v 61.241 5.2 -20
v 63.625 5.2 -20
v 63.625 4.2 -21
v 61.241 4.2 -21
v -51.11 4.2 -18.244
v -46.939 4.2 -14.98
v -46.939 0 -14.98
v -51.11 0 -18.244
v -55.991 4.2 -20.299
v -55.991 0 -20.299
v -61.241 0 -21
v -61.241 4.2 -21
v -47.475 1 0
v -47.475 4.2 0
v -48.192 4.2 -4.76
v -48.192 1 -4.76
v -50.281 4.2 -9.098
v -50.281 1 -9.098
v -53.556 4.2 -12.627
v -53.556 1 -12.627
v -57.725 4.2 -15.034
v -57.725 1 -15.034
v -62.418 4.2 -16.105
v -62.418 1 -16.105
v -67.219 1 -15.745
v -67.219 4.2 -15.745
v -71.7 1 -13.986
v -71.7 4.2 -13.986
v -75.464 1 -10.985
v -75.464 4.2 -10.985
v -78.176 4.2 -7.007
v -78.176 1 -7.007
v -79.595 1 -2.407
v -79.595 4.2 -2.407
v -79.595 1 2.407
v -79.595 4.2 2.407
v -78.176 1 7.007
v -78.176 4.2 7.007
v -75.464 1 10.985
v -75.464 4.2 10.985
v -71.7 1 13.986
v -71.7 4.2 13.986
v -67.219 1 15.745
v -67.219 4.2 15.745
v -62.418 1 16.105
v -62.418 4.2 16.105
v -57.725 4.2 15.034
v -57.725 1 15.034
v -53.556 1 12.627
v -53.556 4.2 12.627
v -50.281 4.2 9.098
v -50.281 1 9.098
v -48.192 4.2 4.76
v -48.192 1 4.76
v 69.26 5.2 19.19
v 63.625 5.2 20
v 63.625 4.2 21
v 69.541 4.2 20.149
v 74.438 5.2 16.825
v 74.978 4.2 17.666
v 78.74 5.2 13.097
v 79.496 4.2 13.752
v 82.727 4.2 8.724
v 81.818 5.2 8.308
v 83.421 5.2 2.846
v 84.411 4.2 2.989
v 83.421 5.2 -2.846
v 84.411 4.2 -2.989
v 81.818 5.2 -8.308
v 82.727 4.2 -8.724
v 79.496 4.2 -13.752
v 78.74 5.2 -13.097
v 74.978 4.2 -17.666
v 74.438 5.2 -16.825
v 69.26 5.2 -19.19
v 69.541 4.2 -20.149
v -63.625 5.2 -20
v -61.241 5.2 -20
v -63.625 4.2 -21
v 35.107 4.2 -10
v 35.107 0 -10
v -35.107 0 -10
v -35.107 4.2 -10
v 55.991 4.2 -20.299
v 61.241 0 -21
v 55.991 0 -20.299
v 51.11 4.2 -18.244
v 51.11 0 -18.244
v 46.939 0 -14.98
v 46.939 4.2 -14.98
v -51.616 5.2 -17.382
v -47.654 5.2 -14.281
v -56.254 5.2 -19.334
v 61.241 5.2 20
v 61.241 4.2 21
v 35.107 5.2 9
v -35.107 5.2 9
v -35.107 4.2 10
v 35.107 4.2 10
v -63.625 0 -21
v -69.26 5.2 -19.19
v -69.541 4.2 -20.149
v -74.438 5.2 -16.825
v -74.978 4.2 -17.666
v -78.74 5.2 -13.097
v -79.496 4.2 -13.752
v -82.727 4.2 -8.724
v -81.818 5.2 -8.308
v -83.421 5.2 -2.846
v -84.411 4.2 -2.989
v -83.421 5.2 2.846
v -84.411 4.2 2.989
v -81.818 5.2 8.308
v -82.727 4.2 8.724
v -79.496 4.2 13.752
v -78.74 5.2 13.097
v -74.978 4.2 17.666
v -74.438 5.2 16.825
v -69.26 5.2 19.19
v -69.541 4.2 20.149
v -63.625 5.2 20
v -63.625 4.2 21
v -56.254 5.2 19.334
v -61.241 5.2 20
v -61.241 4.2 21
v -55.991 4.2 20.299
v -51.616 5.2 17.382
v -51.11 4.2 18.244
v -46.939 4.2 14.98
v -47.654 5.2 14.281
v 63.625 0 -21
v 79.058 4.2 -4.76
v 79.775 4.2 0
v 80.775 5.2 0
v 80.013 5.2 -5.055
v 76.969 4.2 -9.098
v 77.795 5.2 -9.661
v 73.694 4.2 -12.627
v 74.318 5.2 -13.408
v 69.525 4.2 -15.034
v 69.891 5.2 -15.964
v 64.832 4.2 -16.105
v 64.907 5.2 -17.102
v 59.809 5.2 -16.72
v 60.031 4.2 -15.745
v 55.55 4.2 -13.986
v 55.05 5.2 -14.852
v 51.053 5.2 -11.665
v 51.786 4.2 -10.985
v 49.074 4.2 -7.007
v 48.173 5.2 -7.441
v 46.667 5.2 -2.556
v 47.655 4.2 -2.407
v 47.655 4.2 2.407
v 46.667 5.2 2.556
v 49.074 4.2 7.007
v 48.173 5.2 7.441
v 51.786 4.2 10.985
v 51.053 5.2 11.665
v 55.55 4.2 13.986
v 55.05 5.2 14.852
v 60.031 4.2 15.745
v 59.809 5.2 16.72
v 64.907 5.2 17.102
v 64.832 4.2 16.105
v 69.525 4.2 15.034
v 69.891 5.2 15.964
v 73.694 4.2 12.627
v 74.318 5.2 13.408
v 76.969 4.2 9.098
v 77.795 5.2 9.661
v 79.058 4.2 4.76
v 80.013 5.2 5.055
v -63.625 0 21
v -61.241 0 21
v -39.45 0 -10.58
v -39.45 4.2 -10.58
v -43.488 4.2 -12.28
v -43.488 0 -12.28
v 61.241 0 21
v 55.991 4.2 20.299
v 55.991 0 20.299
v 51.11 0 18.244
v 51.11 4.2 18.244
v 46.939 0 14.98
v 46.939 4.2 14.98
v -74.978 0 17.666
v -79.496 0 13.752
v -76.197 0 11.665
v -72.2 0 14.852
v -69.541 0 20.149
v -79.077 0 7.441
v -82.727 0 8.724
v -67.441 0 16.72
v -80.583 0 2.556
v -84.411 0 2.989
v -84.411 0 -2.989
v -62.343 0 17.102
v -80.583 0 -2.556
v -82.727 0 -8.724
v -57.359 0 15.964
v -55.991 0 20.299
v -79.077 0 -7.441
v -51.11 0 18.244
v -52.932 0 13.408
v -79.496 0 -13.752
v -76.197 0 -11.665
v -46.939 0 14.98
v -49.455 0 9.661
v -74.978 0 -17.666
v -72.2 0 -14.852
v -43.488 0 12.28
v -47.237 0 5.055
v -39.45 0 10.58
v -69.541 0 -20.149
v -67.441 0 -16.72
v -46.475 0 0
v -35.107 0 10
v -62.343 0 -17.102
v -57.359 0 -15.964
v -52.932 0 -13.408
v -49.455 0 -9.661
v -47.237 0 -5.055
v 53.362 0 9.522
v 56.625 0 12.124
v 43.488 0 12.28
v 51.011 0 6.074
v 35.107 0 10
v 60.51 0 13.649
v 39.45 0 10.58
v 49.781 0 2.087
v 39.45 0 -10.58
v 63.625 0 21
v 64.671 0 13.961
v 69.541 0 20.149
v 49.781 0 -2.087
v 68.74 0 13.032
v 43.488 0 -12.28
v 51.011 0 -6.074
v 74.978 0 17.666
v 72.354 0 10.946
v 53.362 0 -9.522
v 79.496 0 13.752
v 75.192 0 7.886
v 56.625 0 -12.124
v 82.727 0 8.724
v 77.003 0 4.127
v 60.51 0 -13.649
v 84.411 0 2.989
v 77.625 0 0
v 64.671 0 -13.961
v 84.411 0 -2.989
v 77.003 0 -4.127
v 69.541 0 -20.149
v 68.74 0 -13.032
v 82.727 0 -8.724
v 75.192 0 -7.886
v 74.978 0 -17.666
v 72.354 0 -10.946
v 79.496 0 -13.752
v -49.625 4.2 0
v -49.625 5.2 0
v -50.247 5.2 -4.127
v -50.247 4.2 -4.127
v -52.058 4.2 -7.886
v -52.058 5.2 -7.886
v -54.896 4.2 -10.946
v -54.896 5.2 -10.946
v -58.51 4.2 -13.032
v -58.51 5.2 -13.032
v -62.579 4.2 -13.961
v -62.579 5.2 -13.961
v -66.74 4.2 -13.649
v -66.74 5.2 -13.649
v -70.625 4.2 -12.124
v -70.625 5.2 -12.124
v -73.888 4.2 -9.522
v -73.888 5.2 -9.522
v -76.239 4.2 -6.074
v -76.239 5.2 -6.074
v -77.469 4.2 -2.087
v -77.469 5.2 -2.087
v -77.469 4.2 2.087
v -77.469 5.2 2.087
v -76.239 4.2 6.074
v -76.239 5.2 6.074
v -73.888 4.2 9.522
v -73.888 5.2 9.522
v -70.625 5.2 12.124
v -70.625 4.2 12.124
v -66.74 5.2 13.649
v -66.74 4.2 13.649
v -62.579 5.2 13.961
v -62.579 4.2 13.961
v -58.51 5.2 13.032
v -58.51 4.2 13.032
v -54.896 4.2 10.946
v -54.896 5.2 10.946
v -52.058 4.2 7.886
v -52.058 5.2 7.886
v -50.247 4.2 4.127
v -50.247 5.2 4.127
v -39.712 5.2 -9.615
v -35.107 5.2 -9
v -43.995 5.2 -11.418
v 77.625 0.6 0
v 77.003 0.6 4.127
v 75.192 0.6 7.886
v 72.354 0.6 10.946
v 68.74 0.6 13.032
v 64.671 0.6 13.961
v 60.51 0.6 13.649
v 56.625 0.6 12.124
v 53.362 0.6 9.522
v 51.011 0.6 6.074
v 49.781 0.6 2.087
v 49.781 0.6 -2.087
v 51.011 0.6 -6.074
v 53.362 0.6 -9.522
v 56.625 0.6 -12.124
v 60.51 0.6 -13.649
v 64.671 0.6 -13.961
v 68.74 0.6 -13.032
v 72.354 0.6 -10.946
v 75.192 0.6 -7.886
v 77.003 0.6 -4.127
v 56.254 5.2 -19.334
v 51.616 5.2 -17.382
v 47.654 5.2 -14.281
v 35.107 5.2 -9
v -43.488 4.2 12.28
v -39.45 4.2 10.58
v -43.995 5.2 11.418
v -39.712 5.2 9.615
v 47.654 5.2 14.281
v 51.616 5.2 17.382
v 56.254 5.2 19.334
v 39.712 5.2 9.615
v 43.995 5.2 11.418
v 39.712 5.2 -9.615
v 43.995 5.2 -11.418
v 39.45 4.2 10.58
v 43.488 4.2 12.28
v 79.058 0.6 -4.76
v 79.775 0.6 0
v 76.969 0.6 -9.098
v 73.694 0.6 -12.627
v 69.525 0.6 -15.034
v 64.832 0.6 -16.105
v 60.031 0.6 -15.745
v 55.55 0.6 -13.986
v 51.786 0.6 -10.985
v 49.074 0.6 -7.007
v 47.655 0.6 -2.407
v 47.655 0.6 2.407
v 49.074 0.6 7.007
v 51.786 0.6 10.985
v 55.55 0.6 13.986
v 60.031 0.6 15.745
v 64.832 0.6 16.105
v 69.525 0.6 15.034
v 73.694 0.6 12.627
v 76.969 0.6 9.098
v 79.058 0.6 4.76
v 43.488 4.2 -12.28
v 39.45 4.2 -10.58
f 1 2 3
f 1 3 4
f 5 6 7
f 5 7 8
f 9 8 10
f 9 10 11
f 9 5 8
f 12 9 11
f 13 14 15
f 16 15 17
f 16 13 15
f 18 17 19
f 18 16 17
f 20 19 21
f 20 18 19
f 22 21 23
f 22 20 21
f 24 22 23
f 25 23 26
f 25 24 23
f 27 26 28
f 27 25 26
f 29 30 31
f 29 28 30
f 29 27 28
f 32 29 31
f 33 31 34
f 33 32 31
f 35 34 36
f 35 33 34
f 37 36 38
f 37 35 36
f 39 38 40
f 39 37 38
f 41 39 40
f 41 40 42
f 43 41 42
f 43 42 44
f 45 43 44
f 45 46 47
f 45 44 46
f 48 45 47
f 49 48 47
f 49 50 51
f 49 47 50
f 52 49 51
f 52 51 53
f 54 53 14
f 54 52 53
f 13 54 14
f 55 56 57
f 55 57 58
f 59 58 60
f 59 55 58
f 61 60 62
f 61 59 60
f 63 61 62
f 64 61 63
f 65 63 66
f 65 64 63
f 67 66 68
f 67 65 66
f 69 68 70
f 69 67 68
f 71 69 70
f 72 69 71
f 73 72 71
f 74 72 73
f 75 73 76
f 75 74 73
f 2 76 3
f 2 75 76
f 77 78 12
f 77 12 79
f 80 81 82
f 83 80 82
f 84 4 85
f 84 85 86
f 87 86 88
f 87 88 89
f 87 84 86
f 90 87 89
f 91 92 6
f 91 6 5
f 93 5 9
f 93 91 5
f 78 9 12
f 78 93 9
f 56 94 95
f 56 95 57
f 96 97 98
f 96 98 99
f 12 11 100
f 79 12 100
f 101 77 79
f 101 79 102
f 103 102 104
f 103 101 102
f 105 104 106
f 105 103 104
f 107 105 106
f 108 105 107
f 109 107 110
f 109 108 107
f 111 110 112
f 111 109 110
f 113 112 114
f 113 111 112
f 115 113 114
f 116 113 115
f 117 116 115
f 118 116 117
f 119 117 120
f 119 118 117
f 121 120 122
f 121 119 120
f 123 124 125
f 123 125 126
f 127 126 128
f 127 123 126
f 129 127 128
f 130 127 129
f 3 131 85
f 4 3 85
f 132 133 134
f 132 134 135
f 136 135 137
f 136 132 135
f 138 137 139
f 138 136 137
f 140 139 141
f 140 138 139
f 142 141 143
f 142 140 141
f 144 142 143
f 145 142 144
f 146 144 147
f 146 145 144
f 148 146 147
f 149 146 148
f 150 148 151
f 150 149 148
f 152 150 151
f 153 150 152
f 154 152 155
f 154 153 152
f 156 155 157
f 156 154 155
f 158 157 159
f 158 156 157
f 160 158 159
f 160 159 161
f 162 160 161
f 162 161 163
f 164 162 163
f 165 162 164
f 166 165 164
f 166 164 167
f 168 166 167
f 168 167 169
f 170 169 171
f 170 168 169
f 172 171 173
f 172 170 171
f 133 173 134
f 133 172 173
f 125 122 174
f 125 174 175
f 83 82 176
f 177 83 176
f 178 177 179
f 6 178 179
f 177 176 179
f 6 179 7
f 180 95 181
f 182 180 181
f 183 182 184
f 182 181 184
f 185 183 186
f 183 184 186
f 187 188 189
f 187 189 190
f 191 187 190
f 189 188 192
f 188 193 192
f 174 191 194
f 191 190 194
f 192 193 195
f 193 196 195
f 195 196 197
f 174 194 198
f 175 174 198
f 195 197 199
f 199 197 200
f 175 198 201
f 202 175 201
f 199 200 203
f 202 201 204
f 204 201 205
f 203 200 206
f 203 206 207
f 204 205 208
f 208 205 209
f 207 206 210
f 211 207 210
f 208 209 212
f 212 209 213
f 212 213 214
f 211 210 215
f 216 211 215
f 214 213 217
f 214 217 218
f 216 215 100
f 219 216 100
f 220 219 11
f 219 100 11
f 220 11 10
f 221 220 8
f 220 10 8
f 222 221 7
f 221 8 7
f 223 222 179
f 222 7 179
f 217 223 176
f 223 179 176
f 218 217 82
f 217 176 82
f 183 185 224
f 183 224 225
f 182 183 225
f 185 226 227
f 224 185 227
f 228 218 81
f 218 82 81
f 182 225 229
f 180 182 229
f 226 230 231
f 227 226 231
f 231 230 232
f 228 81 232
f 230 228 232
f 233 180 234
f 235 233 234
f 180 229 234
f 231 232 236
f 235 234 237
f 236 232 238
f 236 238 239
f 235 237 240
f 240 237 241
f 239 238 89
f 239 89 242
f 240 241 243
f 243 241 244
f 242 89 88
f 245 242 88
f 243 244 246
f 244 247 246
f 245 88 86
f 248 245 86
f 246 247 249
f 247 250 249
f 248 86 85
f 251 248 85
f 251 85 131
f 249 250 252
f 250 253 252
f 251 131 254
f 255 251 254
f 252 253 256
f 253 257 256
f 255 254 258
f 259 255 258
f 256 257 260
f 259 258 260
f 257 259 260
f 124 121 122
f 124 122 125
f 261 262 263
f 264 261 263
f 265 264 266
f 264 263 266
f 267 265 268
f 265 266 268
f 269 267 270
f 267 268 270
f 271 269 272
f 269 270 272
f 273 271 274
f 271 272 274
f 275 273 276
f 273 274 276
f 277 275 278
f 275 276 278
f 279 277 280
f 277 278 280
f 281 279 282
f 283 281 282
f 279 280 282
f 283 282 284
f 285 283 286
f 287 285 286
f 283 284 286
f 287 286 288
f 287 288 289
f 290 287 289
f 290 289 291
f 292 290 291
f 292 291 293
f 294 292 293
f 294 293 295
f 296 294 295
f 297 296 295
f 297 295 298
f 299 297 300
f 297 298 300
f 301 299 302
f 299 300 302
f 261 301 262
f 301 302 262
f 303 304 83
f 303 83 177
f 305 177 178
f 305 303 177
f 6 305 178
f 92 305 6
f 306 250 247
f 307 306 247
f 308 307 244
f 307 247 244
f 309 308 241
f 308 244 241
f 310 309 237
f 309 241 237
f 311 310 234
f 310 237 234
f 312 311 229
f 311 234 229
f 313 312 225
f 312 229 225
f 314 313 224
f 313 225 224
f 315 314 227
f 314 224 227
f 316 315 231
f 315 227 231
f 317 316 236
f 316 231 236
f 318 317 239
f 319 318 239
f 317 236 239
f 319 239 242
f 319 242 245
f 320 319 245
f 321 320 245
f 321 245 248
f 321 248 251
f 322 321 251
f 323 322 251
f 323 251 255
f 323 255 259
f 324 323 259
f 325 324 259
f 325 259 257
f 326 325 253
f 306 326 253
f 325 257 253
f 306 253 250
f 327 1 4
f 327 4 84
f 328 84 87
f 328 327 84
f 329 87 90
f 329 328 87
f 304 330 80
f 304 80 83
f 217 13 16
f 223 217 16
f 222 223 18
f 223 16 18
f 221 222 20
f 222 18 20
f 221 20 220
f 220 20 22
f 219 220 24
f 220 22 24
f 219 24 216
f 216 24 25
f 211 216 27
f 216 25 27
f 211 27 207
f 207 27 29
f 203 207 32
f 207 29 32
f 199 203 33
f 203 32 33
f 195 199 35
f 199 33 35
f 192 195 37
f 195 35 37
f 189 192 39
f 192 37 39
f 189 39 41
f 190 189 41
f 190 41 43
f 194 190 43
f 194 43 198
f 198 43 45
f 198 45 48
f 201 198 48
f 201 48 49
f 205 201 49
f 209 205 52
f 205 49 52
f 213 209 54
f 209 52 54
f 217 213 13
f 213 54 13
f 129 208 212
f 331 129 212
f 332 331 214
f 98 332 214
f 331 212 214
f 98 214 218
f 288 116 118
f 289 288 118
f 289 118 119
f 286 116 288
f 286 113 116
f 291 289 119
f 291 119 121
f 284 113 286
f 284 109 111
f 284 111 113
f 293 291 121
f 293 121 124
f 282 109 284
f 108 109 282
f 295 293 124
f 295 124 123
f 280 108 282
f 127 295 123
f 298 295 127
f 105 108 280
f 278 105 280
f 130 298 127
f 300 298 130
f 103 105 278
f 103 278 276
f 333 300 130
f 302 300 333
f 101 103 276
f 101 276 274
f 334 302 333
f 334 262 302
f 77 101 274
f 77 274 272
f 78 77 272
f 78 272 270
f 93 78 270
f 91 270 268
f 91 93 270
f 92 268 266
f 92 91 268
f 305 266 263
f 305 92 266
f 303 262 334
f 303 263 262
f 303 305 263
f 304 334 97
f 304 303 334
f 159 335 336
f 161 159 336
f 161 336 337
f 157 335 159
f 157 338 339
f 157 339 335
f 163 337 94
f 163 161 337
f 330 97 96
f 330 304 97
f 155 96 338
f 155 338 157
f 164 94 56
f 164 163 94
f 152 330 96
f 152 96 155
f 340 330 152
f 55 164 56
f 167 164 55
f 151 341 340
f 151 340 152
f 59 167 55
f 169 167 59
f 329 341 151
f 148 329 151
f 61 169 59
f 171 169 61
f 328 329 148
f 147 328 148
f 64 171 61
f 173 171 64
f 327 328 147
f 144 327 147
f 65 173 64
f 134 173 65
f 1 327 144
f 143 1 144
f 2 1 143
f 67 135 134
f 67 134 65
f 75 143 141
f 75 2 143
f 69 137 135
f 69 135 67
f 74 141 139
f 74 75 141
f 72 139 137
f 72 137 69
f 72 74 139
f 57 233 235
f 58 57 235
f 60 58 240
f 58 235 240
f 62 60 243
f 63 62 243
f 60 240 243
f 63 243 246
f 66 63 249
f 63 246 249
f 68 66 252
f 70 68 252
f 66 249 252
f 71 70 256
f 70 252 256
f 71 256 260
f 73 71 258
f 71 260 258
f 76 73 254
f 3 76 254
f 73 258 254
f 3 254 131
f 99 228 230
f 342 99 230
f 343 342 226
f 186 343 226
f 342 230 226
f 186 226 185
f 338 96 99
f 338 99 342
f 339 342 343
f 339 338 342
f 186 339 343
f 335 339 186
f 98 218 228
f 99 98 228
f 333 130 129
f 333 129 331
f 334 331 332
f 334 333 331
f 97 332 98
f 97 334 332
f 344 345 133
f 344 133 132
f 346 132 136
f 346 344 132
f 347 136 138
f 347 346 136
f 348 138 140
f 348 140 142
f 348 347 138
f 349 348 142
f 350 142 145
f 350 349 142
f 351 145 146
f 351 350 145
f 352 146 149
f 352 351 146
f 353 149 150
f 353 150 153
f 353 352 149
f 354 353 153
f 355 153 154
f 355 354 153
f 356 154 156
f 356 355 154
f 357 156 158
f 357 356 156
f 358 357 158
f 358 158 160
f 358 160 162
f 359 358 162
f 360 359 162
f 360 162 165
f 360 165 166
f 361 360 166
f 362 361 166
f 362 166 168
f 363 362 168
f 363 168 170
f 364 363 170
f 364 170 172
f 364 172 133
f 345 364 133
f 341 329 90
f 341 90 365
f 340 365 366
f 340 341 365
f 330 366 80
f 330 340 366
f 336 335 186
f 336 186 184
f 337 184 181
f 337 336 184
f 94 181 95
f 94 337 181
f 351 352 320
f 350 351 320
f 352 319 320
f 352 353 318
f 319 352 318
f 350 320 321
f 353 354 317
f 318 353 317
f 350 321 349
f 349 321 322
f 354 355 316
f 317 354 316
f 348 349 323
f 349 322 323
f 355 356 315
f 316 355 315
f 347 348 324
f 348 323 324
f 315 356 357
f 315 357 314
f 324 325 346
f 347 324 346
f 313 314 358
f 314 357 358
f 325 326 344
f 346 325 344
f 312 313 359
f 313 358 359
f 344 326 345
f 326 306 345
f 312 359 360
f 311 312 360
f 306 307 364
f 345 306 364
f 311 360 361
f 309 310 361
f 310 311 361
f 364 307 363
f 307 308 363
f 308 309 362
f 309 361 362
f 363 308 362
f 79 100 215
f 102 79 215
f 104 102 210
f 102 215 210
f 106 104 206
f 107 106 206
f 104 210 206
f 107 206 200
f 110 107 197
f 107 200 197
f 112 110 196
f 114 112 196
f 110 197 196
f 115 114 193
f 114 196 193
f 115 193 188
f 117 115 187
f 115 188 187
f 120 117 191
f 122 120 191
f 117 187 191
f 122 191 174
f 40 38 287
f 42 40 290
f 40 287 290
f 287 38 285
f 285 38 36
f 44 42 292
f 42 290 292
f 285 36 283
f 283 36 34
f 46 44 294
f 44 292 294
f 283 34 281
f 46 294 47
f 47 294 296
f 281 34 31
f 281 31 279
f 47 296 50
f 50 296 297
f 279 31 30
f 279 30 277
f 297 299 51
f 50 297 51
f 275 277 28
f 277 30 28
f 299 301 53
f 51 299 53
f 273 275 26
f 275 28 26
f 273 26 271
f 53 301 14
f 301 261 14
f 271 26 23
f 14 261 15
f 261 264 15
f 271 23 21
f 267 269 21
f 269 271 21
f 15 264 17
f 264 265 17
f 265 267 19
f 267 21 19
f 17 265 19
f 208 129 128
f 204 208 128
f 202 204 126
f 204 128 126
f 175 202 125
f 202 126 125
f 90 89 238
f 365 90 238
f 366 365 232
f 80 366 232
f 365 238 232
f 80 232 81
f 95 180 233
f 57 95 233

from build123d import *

# Parameters (mm, degrees)
SKETCH1_R           = 16.15
BOSS_EXTRUDE1_DEPTH = 5.2
FILLET1_R           = 20
CHAMFER1_SIZE       = 1
SKETCH2_R           = 19.025242353
SKETCH2_R_2         = 14
BOSS_EXTRUDE2_DEPTH = 0.6
SKETCH4_R           = 18.71529055
SKETCH4_R_2         = 14
BOSS_EXTRUDE3_DEPTH = 1
CHAMFER2_SIZE       = 1


with BuildPart() as part:
    # Sketch1 → Boss-Extrude1 (new body)
    with BuildSketch(Plane(origin=(0, 0, 0), x_dir=(1, 0, 0), z_dir=(0, 1, 0))):
        with BuildLine():
            Line((50.6952797, -21), (63.625, -21))
            ThreePointArc((63.625, -21), (84.625, 0), (63.625, 21))
            Line((63.625, 21), (50.6952797, 21))
            ThreePointArc((50.6952797, 21), (44.646090821, 13.026866227), (35.106613419, 10))
            Line((35.106613419, 10), (-35.106613419, 10))
            ThreePointArc((-35.106613419, 10), (-44.646090821, 13.026866227), (-50.6952797, 21))
            Line((-50.6952797, 21), (-63.625, 21))
            ThreePointArc((-63.625, 21), (-84.625, 0), (-63.625, -21))
            Line((-63.625, -21), (-50.6952797, -21))
            ThreePointArc((-50.6952797, -21), (-44.646090821, -13.026866227), (-35.106613419, -10))
            Line((-35.106613419, -10), (35.106613419, -10))
            ThreePointArc((35.106613419, -10), (44.646090821, -13.026866227), (50.6952797, -21))
        make_face()
        with Locations((-63.625, 0)):
            Circle(SKETCH1_R, mode=Mode.SUBTRACT)
        with Locations((63.625, 0)):
            Circle(SKETCH1_R, mode=Mode.SUBTRACT)
    extrude(amount=BOSS_EXTRUDE1_DEPTH)

    # Fillet1
    fillet1_edges = [part.edges().sort_by_distance(p)[0] for p in [
        (-50.6952797, 2.6, 21),
        (-50.6952797, 2.6, -21),
        (50.6952797, 2.6, -21),
        (50.6952797, 2.6, 21),
    ]]
    fillet(fillet1_edges, radius=FILLET1_R)

    # Chamfer1
    chamfer1_edges = [part.edges().sort_by_distance(p)[0] for p in [
        (62.433003391, 5.2, 21),
        (84.625, 5.2, 0),
        (62.433003391, 5.2, -21),
        (41.52534742, 5.2, -11.295776268),
        (0, 5.2, -10),
        (41.52534742, 5.2, 11.295776268),
        (-41.52534742, 5.2, -11.295776268),
        (-62.433003391, 5.2, -21),
        (-62.433003391, 5.2, 21),
        (-53.482236449, 5.2, 19.433705079),
        (-53.482236449, 5.2, -19.433705079),
        (-84.625, 5.2, 0),
        (53.482236449, 5.2, -19.433705079),
        (53.482236449, 5.2, 19.433705079),
        (-41.52534742, 5.2, 11.295776268),
        (0, 5.2, 10),
        (47.475, 5.2, 0),
    ]]
    chamfer(chamfer1_edges, length=CHAMFER1_SIZE)

    # Sketch2 → Boss-Extrude2 (add)
    with BuildSketch(Plane.XZ):
        with Locations((63.625, 0)):
            Circle(SKETCH2_R)
        with Locations((63.625, 0)):
            Circle(SKETCH2_R_2, mode=Mode.SUBTRACT)
    extrude(amount=-BOSS_EXTRUDE2_DEPTH)

    # Sketch4 → Boss-Extrude3 (add)
    with BuildSketch(Plane(origin=(0, 5.2, 0), x_dir=(1, 0, 0), z_dir=(0, 1, 0))):
        with Locations((-63.625, 0)):
            Circle(SKETCH4_R)
        with Locations((-63.625, 0)):
            Circle(SKETCH4_R_2, mode=Mode.SUBTRACT)
    extrude(amount=-BOSS_EXTRUDE3_DEPTH)

    # Chamfer2
    chamfer2_edges = [part.edges().sort_by_distance(p)[0] for p in [
        (-79.775, 0, 0),
    ]]
    chamfer(chamfer2_edges, length=CHAMFER2_SIZE)


solid = part.part
